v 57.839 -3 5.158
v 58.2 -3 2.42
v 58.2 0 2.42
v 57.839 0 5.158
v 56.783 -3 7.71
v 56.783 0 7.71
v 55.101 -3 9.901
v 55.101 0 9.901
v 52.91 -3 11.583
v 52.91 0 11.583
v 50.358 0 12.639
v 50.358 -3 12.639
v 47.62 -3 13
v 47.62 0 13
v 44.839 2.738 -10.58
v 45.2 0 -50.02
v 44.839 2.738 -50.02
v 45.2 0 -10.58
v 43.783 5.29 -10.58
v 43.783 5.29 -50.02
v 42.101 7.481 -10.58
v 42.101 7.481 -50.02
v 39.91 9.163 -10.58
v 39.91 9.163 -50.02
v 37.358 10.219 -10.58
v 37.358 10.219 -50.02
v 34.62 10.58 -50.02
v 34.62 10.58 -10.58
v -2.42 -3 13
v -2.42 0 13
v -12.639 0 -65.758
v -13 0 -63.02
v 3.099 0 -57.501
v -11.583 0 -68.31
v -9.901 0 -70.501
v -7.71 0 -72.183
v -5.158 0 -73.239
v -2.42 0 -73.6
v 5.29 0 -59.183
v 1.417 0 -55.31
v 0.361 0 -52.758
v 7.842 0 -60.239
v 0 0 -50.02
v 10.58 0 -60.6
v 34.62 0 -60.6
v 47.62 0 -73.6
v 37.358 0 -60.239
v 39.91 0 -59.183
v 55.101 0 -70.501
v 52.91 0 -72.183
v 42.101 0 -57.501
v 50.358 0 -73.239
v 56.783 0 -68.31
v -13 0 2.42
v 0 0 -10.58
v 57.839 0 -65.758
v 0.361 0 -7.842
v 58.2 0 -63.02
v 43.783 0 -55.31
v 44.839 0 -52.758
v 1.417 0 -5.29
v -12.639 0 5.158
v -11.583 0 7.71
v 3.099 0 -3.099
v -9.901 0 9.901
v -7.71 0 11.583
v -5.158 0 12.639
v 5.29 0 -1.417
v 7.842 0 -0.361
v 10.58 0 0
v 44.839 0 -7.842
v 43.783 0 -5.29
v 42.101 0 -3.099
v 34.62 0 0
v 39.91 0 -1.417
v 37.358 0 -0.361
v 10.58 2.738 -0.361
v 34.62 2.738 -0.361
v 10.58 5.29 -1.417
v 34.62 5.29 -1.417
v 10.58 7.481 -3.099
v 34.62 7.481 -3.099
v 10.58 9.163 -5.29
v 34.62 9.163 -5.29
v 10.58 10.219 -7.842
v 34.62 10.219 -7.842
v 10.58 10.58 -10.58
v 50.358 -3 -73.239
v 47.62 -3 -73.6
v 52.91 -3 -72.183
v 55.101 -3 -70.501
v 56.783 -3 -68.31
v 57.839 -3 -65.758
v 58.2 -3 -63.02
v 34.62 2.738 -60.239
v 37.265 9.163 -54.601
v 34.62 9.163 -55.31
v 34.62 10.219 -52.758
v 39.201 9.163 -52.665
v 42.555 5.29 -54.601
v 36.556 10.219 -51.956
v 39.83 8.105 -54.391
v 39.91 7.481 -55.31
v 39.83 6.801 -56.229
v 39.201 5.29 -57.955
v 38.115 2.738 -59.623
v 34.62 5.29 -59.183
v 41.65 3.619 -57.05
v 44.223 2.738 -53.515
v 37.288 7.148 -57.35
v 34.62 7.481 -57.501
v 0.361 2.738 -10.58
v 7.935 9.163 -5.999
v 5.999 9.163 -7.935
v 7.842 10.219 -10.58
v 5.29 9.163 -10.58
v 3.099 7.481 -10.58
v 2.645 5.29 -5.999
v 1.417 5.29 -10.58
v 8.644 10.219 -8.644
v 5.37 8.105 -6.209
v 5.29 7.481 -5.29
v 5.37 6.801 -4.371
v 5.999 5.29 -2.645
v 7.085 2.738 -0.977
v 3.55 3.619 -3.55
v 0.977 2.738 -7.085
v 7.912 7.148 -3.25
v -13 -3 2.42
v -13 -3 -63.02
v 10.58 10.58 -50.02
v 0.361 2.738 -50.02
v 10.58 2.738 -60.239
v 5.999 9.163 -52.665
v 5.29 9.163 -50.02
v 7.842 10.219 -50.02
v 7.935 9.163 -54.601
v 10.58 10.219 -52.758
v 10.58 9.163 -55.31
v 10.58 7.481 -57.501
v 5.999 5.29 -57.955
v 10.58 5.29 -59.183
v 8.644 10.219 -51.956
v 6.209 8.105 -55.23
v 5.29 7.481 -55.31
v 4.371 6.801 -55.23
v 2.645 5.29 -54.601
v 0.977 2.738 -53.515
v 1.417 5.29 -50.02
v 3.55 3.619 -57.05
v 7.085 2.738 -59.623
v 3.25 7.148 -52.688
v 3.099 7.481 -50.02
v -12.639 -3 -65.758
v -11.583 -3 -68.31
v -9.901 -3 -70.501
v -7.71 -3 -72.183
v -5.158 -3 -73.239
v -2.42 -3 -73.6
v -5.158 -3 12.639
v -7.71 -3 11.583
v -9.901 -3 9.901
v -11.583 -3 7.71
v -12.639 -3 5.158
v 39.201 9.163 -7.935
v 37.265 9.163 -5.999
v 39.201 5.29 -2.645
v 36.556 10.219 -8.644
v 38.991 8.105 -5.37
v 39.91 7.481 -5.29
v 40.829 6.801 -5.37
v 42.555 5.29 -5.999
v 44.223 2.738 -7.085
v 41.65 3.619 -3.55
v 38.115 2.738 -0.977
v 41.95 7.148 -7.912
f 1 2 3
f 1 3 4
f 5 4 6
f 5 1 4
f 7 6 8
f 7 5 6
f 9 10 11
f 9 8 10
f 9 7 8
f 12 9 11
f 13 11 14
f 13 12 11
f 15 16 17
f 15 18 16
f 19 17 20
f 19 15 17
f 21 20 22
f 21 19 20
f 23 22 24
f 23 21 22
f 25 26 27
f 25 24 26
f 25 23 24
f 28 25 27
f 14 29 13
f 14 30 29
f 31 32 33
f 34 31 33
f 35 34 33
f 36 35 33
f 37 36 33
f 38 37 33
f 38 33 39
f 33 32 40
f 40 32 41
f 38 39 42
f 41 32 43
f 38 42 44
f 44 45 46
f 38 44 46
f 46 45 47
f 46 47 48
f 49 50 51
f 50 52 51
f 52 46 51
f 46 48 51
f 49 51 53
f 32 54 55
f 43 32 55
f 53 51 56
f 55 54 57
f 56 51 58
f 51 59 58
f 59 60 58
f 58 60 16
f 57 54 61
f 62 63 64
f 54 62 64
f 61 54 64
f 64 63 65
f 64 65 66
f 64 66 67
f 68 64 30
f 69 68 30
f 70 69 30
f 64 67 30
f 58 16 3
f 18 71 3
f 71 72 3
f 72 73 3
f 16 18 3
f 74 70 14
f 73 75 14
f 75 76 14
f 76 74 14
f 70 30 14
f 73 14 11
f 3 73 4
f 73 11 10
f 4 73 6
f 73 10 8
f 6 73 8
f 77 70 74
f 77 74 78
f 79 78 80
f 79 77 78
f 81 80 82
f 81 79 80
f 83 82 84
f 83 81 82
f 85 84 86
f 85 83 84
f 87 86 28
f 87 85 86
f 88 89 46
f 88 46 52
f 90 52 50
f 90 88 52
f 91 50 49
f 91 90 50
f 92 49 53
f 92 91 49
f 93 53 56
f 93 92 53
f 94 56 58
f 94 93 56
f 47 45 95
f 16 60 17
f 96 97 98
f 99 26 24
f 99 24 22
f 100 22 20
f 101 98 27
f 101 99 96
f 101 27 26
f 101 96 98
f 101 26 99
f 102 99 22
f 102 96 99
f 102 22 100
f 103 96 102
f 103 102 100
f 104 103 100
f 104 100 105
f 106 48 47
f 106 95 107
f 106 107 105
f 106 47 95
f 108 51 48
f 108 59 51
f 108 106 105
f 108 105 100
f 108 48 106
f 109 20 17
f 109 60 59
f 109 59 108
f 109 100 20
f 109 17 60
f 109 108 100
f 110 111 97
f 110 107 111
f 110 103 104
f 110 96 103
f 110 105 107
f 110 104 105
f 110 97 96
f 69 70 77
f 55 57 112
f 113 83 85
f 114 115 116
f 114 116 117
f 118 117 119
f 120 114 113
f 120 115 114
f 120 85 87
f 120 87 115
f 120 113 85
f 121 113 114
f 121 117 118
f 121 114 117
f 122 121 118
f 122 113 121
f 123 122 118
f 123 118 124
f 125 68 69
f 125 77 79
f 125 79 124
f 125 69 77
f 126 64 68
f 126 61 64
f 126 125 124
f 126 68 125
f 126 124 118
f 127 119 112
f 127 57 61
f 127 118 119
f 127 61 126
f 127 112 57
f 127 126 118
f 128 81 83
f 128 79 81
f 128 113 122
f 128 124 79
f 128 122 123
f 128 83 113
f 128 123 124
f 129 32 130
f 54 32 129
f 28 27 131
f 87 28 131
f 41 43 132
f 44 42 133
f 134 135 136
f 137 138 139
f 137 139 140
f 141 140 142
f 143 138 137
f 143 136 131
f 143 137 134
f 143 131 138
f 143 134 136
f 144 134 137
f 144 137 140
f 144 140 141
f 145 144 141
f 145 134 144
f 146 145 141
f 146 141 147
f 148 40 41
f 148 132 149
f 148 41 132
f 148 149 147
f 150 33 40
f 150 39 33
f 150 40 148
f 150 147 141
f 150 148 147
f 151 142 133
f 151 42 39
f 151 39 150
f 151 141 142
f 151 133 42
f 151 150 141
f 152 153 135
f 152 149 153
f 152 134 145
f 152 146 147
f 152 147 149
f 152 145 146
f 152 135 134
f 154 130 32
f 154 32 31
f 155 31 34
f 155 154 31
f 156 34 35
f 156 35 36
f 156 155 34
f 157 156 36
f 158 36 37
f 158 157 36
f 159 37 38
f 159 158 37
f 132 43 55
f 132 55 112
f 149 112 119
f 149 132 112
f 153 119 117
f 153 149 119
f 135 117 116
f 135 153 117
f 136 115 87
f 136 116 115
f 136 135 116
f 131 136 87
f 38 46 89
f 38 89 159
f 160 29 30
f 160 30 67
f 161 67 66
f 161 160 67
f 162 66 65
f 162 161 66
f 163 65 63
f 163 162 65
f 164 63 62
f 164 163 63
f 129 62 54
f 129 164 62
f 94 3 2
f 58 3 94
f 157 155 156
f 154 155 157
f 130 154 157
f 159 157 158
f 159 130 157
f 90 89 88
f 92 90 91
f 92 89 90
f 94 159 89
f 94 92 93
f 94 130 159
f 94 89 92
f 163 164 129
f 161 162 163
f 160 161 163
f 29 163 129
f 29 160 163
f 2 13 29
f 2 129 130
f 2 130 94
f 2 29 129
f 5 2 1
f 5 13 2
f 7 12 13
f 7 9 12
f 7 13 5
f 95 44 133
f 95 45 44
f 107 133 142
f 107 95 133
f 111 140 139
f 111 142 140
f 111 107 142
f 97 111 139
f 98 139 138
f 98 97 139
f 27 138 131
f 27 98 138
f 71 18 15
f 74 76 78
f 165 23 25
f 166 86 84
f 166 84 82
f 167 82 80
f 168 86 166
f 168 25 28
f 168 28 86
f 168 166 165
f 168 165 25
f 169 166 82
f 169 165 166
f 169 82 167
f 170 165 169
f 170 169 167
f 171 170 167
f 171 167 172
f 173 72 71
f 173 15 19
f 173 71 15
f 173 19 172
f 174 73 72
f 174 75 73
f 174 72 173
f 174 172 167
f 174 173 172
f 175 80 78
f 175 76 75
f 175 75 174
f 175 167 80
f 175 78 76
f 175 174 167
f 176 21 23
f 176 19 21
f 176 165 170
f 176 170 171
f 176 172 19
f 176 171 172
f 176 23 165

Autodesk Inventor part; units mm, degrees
ref_plane "YZ Plane" through (0, 0, 0) normal (1, 0, 0) x (0, 1, 0)
ref_plane "XZ Plane" through (0, 0, 0) normal (0, 1, 0) x (-1, 0, 0)
ref_plane "XY Plane" through (0, 0, 0) normal (0, 0, 1) x (1, 0, 0)
sketch "Sketch1" plane through (0, 0, 0) normal (0, 1, 0) x (-1, 0, 0)
  line L0 (0, 0) -> (-45.2, 0)
  line L1 (-45.2, 0) -> (-45.2, -60.6)
  line L2 (-45.2, -60.6) -> (0, -60.6)
  line L3 (0, -60.6) -> (0, 0)
  dimension "d0" = 45.2
  dimension "d1" = 60.6
extrude "Extrusion1" add sketch "Sketch1" along normal blind 10.58
fillet "Fillet1" radius 10.58 4 edges at (45.2, 5.29, 0) (45.2, 5.29, -60.6) (0, 5.29, -60.6) (0, 5.29, 0)
fillet "Fillet2" radius 10.58 8 edges at (42.1012, 10.58, -57.5012) (22.6, 10.58, -60.6) (3.0988, 10.58, -57.5012) (0, 10.58, -30.3) (3.0988, 10.58, -3.0988) (22.6, 10.58, 0) (42.1012, 10.58, -3.0988) (45.2, 10.58, -30.3)
sketch "Sketch3" plane through (0, 0, 0) normal (0, -1, 0) x (1, 0, 0)
  line L0 (0, 0) -> (-13, 0)
  line L1 (-13, 0) -> (-13, 13)
  line L2 (-13, 13) -> (0, 13)
  line L3 (0, 13) -> (0, 0)
  line L4 (34.62, -50.02) -> (34.62, -10.58) projected
  line L5 (34.62, -50.02) -> (45.2, -50.02)
  line L6 (45.2, -50.02) -> (45.2, -60.6)
  line L7 (45.2, -60.6) -> (34.62, -60.6)
  line L8 (34.62, -60.6) -> (34.62, -50.02)
  line L9 (45.2, -60.6) -> (58.2, -60.6)
  line L10 (58.2, -60.6) -> (58.2, -73.6)
  line L11 (58.2, -73.6) -> (45.2, -73.6)
  line L12 (45.2, -73.6) -> (45.2, -60.6)
  line L13 (-13, 13) -> (58.2, 13)
  line L14 (58.2, 13) -> (58.2, -73.6)
  line L15 (58.2, -73.6) -> (-13, -73.6)
  line L16 (-13, -73.6) -> (-13, 13)
  dimension "d14" = 13
  dimension "d15" = 13
  dimension "d16" = 13
  dimension "d17" = 13
extrude "Extrusion3" add sketch "Sketch3" along normal blind 3 contours L7 L8 L5 L6 | L3 L13 L14 L9 L12 L15 L16 L0 | L0 L1 L2 L3 | L12 L9 L10 L11
fillet "Fillet4" radius 10.58 4 edges at (-13, -1.5, 13) (-13, -1.5, -73.6) (58.2, -1.5, -73.6) (58.2, -1.5, 13)
properties part number "Airpods Pro Base"
